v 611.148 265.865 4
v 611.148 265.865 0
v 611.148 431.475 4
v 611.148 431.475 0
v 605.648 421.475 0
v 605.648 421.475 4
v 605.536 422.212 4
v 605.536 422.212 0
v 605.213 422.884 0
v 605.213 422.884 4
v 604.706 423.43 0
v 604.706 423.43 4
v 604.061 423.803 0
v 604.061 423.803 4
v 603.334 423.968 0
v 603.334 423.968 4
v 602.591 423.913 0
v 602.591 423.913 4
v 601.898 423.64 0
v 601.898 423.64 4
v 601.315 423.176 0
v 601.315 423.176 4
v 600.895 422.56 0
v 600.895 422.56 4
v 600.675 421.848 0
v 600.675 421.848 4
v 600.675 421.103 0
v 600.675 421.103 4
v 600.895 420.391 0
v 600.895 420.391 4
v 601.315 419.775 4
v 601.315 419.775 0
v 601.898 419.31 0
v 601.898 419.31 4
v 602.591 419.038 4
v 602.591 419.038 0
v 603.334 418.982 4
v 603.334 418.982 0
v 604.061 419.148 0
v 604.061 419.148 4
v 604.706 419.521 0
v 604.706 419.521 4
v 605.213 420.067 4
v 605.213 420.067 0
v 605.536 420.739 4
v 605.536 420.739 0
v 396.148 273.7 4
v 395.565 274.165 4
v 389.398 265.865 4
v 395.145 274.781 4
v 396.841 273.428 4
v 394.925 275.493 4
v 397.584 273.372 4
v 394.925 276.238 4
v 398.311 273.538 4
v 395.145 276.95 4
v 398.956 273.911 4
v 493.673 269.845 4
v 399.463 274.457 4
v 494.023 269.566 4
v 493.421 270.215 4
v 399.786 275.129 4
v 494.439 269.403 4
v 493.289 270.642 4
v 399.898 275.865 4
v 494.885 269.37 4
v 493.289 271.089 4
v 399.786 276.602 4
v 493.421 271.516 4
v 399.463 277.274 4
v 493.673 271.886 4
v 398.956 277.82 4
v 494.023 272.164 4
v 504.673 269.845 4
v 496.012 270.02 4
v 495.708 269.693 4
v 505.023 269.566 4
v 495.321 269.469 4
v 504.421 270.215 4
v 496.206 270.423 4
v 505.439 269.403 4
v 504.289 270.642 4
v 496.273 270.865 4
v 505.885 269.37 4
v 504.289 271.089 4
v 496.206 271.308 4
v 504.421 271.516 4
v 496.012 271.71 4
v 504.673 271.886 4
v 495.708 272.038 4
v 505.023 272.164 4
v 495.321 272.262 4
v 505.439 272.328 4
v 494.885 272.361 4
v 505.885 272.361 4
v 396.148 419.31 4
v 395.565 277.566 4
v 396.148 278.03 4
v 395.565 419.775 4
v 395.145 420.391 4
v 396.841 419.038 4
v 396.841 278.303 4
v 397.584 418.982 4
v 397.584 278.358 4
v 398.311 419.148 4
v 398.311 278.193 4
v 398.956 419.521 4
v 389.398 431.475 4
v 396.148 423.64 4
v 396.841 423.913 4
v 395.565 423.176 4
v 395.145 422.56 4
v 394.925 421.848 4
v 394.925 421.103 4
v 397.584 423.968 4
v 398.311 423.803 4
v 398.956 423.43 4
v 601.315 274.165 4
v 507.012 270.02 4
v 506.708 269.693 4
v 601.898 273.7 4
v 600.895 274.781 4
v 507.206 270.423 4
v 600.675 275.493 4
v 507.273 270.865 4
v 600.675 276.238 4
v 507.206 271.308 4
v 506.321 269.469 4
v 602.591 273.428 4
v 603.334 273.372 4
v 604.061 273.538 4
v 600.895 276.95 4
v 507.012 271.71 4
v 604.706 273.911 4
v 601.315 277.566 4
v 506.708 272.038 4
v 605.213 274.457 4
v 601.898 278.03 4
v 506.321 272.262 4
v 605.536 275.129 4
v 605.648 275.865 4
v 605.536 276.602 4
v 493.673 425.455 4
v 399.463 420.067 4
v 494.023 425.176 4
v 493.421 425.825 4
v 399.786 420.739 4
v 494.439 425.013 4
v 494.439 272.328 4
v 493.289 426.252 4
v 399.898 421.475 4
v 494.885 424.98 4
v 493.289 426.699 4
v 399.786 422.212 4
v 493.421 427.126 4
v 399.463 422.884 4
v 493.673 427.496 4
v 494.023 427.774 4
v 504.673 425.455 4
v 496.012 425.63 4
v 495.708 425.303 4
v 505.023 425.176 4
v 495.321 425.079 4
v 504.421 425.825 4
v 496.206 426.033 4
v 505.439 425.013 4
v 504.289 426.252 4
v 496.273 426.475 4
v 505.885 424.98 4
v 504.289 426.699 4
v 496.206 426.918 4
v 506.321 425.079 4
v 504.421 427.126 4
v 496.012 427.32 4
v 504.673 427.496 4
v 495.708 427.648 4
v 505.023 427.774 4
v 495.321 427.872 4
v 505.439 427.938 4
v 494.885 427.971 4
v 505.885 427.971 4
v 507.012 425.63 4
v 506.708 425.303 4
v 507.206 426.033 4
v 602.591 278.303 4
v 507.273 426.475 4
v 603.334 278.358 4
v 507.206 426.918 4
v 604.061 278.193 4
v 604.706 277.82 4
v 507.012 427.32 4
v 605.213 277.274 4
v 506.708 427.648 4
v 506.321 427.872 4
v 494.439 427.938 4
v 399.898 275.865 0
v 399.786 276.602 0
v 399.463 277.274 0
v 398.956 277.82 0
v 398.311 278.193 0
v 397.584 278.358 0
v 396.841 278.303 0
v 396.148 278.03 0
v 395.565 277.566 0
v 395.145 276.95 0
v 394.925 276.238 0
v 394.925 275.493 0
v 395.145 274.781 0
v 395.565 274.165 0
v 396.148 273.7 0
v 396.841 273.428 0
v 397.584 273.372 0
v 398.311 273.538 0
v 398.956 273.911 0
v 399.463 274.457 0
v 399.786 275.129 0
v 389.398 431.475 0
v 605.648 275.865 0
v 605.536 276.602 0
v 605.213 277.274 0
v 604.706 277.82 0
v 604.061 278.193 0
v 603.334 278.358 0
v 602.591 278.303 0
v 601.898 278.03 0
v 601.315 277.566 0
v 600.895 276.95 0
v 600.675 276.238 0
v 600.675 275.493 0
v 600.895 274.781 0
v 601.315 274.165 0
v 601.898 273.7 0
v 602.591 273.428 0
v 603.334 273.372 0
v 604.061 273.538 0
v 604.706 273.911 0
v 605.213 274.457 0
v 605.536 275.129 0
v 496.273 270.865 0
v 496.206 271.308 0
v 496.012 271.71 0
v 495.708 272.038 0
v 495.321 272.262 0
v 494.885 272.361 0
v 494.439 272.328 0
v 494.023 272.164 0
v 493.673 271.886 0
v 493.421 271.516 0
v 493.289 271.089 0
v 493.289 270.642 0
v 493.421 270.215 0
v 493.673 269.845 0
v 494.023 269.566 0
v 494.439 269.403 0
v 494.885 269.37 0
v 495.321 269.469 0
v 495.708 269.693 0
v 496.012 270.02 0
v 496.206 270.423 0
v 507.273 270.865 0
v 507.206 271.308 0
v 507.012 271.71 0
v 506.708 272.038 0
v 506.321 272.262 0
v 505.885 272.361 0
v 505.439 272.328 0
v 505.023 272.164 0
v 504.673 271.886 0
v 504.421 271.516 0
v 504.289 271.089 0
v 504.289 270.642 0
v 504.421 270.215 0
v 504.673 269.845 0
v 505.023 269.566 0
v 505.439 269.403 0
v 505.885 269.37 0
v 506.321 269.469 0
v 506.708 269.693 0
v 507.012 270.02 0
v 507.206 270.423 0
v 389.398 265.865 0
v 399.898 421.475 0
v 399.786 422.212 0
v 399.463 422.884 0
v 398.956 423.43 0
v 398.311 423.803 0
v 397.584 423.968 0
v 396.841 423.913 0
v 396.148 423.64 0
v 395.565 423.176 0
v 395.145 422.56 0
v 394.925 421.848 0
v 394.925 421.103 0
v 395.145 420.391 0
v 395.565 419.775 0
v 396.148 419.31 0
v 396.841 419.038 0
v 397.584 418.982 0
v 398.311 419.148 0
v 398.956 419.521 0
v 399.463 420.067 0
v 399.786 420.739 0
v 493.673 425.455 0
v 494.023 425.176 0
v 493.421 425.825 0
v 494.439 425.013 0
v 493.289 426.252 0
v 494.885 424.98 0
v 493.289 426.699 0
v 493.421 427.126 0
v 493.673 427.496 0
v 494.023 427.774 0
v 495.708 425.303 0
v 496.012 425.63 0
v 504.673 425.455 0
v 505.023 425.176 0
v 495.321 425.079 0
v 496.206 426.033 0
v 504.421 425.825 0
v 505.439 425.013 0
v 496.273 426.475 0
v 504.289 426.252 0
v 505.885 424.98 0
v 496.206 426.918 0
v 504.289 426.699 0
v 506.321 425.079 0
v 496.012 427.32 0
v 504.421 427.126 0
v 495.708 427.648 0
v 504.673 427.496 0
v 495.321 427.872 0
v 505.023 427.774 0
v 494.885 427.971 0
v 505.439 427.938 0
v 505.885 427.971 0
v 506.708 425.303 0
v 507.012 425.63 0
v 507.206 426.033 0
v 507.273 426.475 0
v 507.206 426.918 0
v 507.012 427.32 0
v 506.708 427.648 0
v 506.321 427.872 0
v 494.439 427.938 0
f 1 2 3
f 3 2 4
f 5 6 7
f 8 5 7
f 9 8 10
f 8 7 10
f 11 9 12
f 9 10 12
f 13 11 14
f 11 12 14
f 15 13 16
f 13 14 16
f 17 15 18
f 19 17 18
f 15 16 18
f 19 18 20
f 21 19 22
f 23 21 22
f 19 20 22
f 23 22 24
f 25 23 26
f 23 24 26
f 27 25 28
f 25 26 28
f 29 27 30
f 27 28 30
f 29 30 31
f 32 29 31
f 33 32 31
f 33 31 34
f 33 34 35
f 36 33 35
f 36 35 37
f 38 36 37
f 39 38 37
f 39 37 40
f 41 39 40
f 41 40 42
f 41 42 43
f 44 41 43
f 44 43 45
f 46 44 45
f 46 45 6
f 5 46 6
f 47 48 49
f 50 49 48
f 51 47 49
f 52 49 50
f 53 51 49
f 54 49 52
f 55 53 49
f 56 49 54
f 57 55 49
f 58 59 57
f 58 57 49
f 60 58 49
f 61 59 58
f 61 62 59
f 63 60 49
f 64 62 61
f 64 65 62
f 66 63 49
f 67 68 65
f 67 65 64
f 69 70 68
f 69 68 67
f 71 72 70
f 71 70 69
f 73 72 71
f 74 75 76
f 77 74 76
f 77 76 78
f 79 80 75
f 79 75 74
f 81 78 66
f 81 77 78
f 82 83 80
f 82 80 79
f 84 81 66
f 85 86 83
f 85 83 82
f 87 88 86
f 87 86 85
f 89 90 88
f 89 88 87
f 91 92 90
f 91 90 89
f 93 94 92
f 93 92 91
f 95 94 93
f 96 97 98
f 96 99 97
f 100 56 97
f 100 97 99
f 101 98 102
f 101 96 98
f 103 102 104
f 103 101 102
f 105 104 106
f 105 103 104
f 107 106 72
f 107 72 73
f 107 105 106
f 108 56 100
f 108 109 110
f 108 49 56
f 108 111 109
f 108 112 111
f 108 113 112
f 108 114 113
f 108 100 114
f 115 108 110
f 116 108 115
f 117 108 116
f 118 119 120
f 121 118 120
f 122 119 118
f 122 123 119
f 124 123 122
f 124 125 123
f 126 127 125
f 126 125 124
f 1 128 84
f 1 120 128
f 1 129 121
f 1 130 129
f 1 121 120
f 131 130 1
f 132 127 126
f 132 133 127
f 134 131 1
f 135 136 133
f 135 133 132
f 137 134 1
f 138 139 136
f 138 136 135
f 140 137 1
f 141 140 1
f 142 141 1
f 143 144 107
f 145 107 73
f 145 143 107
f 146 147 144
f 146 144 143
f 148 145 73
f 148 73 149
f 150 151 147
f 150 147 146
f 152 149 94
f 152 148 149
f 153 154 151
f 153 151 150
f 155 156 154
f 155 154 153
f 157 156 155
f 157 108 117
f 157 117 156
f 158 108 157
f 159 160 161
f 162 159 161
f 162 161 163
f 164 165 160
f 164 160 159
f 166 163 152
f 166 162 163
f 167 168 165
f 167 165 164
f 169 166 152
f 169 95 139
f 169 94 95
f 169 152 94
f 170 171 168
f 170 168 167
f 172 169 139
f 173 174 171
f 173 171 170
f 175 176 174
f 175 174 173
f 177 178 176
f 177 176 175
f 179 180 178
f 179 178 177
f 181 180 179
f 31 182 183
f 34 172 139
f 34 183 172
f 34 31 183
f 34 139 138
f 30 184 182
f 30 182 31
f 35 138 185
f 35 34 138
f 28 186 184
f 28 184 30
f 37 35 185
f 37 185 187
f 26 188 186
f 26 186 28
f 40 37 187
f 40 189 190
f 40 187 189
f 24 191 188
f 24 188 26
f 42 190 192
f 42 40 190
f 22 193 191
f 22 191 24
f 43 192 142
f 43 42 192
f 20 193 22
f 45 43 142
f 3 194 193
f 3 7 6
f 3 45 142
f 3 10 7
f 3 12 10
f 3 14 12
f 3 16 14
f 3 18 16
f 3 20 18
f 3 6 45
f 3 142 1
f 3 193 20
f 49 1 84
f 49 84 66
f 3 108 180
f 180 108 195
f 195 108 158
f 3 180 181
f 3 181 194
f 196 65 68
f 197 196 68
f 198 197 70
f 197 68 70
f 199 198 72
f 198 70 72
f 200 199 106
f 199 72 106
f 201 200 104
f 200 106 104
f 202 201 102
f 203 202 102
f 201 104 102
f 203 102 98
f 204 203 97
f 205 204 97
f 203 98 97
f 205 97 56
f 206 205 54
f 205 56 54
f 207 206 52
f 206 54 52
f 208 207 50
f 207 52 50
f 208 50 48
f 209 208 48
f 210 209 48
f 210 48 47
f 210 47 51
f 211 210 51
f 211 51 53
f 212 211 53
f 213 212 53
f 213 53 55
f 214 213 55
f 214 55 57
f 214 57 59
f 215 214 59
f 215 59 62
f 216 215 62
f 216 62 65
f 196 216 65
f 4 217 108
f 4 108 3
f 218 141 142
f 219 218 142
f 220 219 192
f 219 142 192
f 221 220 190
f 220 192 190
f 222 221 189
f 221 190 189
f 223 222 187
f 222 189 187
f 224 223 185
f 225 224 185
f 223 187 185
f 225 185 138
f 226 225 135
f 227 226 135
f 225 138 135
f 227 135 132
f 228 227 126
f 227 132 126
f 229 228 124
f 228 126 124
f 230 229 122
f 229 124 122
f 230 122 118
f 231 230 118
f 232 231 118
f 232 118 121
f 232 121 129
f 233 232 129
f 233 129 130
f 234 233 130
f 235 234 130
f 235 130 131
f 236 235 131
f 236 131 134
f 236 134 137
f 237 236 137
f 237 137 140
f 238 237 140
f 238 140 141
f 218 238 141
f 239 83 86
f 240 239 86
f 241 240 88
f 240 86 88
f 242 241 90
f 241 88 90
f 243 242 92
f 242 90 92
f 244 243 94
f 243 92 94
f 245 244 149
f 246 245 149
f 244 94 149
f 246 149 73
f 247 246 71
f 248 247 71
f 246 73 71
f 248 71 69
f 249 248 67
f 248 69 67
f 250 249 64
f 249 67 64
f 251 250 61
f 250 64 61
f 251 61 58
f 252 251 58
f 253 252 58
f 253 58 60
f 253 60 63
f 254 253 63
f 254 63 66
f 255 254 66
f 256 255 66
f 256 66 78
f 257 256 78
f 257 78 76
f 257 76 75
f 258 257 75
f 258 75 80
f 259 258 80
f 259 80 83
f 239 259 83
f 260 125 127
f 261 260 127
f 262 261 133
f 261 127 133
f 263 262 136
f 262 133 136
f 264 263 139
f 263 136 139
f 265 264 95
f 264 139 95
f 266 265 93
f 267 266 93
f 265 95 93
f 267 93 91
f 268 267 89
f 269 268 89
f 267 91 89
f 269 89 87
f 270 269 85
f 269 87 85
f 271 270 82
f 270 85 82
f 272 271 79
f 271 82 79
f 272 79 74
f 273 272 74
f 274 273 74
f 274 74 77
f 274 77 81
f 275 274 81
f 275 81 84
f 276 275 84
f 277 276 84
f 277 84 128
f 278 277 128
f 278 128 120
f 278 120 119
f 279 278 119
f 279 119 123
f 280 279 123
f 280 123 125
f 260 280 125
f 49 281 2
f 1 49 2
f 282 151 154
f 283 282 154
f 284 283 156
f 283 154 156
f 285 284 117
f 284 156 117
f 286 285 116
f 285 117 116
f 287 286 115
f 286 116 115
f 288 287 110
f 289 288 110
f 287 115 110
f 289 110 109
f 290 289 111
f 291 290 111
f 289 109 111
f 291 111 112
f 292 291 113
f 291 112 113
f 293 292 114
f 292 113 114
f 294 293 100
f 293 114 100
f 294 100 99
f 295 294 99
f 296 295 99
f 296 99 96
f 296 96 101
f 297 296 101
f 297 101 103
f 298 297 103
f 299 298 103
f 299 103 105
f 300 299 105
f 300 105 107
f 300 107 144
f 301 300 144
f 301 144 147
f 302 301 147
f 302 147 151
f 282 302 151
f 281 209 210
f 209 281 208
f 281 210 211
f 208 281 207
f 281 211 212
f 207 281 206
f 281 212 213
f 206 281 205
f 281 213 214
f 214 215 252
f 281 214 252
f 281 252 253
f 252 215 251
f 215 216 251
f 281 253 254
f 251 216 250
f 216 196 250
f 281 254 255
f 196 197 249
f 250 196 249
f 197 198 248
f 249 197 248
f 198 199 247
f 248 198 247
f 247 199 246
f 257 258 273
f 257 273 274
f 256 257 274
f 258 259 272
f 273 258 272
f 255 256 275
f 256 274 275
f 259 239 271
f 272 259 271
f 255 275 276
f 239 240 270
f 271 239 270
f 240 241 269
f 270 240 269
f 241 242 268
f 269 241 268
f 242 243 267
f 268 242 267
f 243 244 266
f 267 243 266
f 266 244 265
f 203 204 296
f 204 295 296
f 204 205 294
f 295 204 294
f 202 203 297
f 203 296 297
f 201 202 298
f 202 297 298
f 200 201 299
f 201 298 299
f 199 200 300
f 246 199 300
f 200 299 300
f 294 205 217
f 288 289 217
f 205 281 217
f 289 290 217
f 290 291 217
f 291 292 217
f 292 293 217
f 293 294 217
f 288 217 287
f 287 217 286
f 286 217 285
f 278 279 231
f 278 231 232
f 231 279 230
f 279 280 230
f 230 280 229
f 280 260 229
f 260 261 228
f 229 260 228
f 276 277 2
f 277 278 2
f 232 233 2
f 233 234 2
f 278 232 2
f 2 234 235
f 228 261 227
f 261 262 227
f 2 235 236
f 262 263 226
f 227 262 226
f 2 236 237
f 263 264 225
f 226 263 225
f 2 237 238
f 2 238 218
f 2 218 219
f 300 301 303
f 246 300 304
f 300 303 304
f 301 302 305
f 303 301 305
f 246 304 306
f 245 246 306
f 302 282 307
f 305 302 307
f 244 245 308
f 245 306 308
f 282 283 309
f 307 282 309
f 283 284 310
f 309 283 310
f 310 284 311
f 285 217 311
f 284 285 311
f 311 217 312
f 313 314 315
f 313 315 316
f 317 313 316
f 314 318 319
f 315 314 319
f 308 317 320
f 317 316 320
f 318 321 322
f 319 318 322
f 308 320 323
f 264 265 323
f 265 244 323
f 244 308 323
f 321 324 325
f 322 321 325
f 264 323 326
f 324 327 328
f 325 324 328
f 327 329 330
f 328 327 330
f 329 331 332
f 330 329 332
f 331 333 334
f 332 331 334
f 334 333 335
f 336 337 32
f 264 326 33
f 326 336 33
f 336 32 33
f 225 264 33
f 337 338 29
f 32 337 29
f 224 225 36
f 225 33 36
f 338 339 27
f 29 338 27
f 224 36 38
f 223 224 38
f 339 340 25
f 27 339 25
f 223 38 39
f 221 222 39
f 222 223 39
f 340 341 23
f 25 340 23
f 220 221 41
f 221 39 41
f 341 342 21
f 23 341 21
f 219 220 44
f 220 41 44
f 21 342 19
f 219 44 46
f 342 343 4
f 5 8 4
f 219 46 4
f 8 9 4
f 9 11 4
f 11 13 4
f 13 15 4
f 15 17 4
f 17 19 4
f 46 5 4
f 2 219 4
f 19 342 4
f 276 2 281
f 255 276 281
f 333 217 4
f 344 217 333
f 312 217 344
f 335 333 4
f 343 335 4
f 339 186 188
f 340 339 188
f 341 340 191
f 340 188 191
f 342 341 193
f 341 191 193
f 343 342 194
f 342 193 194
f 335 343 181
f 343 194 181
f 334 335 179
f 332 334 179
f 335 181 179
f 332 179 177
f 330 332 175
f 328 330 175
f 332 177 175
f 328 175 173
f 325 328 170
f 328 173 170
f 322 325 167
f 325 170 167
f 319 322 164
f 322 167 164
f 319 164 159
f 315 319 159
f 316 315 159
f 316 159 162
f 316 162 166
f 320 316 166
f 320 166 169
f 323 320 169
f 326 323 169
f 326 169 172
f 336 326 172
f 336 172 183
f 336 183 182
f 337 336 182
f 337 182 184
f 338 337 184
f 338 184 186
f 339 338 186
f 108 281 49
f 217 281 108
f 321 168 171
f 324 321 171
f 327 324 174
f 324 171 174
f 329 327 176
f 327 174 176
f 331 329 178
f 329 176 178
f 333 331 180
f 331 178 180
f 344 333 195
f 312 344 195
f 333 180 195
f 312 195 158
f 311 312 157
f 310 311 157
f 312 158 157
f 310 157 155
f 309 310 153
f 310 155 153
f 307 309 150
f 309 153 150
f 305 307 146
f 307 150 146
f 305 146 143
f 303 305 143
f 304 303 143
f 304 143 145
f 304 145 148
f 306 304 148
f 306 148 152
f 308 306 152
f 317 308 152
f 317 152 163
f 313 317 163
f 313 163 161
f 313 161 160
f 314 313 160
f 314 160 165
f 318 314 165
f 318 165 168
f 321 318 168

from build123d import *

# Parameters (mm, degrees)
SKETCH1_W           = 221.75
SKETCH1_H           = 165.61
BOSS_EXTRUDE1_DEPTH = 4
SKETCH3_R           = 2.5
CUT_EXTRUDE1_DEPTH  = 5
SKETCH4_R           = 1.5
CUT_EXTRUDE2_DEPTH  = 10


with BuildPart() as part:
    # Sketch1 → Boss-Extrude1 (new body)
    with BuildSketch(Plane.XY):
        with Locations((500.272540984, 348.670409836)):
            Rectangle(SKETCH1_W, SKETCH1_H)
    extrude(amount=BOSS_EXTRUDE1_DEPTH)

    # Sketch3 → Cut-Extrude1 (cut, through all)
    with BuildSketch(Plane.XY.offset(4)):
        with Locations((397.397540984, 421.475409836)):
            Circle(SKETCH3_R)
        with Locations((603.147540984, 421.475409836)):
            Circle(SKETCH3_R)
        with Locations((603.147540984, 275.865409836)):
            Circle(SKETCH3_R)
        with Locations((397.397540984, 275.865409836)):
            Circle(SKETCH3_R)
    extrude(amount=-CUT_EXTRUDE1_DEPTH, mode=Mode.SUBTRACT)

    # Sketch4 → Cut-Extrude2 (cut)
    with BuildSketch(Plane.XY.offset(4)):
        with Locations((494.772540984, 270.865409836)):
            Circle(SKETCH4_R)
        with Locations((505.772540984, 270.865409836)):
            Circle(SKETCH4_R)
        with Locations((494.772540984, 426.475409836)):
            Circle(SKETCH4_R)
        with Locations((505.772540984, 426.475409836)):
            Circle(SKETCH4_R)
    extrude(amount=-CUT_EXTRUDE2_DEPTH, mode=Mode.SUBTRACT)


solid = part.part
